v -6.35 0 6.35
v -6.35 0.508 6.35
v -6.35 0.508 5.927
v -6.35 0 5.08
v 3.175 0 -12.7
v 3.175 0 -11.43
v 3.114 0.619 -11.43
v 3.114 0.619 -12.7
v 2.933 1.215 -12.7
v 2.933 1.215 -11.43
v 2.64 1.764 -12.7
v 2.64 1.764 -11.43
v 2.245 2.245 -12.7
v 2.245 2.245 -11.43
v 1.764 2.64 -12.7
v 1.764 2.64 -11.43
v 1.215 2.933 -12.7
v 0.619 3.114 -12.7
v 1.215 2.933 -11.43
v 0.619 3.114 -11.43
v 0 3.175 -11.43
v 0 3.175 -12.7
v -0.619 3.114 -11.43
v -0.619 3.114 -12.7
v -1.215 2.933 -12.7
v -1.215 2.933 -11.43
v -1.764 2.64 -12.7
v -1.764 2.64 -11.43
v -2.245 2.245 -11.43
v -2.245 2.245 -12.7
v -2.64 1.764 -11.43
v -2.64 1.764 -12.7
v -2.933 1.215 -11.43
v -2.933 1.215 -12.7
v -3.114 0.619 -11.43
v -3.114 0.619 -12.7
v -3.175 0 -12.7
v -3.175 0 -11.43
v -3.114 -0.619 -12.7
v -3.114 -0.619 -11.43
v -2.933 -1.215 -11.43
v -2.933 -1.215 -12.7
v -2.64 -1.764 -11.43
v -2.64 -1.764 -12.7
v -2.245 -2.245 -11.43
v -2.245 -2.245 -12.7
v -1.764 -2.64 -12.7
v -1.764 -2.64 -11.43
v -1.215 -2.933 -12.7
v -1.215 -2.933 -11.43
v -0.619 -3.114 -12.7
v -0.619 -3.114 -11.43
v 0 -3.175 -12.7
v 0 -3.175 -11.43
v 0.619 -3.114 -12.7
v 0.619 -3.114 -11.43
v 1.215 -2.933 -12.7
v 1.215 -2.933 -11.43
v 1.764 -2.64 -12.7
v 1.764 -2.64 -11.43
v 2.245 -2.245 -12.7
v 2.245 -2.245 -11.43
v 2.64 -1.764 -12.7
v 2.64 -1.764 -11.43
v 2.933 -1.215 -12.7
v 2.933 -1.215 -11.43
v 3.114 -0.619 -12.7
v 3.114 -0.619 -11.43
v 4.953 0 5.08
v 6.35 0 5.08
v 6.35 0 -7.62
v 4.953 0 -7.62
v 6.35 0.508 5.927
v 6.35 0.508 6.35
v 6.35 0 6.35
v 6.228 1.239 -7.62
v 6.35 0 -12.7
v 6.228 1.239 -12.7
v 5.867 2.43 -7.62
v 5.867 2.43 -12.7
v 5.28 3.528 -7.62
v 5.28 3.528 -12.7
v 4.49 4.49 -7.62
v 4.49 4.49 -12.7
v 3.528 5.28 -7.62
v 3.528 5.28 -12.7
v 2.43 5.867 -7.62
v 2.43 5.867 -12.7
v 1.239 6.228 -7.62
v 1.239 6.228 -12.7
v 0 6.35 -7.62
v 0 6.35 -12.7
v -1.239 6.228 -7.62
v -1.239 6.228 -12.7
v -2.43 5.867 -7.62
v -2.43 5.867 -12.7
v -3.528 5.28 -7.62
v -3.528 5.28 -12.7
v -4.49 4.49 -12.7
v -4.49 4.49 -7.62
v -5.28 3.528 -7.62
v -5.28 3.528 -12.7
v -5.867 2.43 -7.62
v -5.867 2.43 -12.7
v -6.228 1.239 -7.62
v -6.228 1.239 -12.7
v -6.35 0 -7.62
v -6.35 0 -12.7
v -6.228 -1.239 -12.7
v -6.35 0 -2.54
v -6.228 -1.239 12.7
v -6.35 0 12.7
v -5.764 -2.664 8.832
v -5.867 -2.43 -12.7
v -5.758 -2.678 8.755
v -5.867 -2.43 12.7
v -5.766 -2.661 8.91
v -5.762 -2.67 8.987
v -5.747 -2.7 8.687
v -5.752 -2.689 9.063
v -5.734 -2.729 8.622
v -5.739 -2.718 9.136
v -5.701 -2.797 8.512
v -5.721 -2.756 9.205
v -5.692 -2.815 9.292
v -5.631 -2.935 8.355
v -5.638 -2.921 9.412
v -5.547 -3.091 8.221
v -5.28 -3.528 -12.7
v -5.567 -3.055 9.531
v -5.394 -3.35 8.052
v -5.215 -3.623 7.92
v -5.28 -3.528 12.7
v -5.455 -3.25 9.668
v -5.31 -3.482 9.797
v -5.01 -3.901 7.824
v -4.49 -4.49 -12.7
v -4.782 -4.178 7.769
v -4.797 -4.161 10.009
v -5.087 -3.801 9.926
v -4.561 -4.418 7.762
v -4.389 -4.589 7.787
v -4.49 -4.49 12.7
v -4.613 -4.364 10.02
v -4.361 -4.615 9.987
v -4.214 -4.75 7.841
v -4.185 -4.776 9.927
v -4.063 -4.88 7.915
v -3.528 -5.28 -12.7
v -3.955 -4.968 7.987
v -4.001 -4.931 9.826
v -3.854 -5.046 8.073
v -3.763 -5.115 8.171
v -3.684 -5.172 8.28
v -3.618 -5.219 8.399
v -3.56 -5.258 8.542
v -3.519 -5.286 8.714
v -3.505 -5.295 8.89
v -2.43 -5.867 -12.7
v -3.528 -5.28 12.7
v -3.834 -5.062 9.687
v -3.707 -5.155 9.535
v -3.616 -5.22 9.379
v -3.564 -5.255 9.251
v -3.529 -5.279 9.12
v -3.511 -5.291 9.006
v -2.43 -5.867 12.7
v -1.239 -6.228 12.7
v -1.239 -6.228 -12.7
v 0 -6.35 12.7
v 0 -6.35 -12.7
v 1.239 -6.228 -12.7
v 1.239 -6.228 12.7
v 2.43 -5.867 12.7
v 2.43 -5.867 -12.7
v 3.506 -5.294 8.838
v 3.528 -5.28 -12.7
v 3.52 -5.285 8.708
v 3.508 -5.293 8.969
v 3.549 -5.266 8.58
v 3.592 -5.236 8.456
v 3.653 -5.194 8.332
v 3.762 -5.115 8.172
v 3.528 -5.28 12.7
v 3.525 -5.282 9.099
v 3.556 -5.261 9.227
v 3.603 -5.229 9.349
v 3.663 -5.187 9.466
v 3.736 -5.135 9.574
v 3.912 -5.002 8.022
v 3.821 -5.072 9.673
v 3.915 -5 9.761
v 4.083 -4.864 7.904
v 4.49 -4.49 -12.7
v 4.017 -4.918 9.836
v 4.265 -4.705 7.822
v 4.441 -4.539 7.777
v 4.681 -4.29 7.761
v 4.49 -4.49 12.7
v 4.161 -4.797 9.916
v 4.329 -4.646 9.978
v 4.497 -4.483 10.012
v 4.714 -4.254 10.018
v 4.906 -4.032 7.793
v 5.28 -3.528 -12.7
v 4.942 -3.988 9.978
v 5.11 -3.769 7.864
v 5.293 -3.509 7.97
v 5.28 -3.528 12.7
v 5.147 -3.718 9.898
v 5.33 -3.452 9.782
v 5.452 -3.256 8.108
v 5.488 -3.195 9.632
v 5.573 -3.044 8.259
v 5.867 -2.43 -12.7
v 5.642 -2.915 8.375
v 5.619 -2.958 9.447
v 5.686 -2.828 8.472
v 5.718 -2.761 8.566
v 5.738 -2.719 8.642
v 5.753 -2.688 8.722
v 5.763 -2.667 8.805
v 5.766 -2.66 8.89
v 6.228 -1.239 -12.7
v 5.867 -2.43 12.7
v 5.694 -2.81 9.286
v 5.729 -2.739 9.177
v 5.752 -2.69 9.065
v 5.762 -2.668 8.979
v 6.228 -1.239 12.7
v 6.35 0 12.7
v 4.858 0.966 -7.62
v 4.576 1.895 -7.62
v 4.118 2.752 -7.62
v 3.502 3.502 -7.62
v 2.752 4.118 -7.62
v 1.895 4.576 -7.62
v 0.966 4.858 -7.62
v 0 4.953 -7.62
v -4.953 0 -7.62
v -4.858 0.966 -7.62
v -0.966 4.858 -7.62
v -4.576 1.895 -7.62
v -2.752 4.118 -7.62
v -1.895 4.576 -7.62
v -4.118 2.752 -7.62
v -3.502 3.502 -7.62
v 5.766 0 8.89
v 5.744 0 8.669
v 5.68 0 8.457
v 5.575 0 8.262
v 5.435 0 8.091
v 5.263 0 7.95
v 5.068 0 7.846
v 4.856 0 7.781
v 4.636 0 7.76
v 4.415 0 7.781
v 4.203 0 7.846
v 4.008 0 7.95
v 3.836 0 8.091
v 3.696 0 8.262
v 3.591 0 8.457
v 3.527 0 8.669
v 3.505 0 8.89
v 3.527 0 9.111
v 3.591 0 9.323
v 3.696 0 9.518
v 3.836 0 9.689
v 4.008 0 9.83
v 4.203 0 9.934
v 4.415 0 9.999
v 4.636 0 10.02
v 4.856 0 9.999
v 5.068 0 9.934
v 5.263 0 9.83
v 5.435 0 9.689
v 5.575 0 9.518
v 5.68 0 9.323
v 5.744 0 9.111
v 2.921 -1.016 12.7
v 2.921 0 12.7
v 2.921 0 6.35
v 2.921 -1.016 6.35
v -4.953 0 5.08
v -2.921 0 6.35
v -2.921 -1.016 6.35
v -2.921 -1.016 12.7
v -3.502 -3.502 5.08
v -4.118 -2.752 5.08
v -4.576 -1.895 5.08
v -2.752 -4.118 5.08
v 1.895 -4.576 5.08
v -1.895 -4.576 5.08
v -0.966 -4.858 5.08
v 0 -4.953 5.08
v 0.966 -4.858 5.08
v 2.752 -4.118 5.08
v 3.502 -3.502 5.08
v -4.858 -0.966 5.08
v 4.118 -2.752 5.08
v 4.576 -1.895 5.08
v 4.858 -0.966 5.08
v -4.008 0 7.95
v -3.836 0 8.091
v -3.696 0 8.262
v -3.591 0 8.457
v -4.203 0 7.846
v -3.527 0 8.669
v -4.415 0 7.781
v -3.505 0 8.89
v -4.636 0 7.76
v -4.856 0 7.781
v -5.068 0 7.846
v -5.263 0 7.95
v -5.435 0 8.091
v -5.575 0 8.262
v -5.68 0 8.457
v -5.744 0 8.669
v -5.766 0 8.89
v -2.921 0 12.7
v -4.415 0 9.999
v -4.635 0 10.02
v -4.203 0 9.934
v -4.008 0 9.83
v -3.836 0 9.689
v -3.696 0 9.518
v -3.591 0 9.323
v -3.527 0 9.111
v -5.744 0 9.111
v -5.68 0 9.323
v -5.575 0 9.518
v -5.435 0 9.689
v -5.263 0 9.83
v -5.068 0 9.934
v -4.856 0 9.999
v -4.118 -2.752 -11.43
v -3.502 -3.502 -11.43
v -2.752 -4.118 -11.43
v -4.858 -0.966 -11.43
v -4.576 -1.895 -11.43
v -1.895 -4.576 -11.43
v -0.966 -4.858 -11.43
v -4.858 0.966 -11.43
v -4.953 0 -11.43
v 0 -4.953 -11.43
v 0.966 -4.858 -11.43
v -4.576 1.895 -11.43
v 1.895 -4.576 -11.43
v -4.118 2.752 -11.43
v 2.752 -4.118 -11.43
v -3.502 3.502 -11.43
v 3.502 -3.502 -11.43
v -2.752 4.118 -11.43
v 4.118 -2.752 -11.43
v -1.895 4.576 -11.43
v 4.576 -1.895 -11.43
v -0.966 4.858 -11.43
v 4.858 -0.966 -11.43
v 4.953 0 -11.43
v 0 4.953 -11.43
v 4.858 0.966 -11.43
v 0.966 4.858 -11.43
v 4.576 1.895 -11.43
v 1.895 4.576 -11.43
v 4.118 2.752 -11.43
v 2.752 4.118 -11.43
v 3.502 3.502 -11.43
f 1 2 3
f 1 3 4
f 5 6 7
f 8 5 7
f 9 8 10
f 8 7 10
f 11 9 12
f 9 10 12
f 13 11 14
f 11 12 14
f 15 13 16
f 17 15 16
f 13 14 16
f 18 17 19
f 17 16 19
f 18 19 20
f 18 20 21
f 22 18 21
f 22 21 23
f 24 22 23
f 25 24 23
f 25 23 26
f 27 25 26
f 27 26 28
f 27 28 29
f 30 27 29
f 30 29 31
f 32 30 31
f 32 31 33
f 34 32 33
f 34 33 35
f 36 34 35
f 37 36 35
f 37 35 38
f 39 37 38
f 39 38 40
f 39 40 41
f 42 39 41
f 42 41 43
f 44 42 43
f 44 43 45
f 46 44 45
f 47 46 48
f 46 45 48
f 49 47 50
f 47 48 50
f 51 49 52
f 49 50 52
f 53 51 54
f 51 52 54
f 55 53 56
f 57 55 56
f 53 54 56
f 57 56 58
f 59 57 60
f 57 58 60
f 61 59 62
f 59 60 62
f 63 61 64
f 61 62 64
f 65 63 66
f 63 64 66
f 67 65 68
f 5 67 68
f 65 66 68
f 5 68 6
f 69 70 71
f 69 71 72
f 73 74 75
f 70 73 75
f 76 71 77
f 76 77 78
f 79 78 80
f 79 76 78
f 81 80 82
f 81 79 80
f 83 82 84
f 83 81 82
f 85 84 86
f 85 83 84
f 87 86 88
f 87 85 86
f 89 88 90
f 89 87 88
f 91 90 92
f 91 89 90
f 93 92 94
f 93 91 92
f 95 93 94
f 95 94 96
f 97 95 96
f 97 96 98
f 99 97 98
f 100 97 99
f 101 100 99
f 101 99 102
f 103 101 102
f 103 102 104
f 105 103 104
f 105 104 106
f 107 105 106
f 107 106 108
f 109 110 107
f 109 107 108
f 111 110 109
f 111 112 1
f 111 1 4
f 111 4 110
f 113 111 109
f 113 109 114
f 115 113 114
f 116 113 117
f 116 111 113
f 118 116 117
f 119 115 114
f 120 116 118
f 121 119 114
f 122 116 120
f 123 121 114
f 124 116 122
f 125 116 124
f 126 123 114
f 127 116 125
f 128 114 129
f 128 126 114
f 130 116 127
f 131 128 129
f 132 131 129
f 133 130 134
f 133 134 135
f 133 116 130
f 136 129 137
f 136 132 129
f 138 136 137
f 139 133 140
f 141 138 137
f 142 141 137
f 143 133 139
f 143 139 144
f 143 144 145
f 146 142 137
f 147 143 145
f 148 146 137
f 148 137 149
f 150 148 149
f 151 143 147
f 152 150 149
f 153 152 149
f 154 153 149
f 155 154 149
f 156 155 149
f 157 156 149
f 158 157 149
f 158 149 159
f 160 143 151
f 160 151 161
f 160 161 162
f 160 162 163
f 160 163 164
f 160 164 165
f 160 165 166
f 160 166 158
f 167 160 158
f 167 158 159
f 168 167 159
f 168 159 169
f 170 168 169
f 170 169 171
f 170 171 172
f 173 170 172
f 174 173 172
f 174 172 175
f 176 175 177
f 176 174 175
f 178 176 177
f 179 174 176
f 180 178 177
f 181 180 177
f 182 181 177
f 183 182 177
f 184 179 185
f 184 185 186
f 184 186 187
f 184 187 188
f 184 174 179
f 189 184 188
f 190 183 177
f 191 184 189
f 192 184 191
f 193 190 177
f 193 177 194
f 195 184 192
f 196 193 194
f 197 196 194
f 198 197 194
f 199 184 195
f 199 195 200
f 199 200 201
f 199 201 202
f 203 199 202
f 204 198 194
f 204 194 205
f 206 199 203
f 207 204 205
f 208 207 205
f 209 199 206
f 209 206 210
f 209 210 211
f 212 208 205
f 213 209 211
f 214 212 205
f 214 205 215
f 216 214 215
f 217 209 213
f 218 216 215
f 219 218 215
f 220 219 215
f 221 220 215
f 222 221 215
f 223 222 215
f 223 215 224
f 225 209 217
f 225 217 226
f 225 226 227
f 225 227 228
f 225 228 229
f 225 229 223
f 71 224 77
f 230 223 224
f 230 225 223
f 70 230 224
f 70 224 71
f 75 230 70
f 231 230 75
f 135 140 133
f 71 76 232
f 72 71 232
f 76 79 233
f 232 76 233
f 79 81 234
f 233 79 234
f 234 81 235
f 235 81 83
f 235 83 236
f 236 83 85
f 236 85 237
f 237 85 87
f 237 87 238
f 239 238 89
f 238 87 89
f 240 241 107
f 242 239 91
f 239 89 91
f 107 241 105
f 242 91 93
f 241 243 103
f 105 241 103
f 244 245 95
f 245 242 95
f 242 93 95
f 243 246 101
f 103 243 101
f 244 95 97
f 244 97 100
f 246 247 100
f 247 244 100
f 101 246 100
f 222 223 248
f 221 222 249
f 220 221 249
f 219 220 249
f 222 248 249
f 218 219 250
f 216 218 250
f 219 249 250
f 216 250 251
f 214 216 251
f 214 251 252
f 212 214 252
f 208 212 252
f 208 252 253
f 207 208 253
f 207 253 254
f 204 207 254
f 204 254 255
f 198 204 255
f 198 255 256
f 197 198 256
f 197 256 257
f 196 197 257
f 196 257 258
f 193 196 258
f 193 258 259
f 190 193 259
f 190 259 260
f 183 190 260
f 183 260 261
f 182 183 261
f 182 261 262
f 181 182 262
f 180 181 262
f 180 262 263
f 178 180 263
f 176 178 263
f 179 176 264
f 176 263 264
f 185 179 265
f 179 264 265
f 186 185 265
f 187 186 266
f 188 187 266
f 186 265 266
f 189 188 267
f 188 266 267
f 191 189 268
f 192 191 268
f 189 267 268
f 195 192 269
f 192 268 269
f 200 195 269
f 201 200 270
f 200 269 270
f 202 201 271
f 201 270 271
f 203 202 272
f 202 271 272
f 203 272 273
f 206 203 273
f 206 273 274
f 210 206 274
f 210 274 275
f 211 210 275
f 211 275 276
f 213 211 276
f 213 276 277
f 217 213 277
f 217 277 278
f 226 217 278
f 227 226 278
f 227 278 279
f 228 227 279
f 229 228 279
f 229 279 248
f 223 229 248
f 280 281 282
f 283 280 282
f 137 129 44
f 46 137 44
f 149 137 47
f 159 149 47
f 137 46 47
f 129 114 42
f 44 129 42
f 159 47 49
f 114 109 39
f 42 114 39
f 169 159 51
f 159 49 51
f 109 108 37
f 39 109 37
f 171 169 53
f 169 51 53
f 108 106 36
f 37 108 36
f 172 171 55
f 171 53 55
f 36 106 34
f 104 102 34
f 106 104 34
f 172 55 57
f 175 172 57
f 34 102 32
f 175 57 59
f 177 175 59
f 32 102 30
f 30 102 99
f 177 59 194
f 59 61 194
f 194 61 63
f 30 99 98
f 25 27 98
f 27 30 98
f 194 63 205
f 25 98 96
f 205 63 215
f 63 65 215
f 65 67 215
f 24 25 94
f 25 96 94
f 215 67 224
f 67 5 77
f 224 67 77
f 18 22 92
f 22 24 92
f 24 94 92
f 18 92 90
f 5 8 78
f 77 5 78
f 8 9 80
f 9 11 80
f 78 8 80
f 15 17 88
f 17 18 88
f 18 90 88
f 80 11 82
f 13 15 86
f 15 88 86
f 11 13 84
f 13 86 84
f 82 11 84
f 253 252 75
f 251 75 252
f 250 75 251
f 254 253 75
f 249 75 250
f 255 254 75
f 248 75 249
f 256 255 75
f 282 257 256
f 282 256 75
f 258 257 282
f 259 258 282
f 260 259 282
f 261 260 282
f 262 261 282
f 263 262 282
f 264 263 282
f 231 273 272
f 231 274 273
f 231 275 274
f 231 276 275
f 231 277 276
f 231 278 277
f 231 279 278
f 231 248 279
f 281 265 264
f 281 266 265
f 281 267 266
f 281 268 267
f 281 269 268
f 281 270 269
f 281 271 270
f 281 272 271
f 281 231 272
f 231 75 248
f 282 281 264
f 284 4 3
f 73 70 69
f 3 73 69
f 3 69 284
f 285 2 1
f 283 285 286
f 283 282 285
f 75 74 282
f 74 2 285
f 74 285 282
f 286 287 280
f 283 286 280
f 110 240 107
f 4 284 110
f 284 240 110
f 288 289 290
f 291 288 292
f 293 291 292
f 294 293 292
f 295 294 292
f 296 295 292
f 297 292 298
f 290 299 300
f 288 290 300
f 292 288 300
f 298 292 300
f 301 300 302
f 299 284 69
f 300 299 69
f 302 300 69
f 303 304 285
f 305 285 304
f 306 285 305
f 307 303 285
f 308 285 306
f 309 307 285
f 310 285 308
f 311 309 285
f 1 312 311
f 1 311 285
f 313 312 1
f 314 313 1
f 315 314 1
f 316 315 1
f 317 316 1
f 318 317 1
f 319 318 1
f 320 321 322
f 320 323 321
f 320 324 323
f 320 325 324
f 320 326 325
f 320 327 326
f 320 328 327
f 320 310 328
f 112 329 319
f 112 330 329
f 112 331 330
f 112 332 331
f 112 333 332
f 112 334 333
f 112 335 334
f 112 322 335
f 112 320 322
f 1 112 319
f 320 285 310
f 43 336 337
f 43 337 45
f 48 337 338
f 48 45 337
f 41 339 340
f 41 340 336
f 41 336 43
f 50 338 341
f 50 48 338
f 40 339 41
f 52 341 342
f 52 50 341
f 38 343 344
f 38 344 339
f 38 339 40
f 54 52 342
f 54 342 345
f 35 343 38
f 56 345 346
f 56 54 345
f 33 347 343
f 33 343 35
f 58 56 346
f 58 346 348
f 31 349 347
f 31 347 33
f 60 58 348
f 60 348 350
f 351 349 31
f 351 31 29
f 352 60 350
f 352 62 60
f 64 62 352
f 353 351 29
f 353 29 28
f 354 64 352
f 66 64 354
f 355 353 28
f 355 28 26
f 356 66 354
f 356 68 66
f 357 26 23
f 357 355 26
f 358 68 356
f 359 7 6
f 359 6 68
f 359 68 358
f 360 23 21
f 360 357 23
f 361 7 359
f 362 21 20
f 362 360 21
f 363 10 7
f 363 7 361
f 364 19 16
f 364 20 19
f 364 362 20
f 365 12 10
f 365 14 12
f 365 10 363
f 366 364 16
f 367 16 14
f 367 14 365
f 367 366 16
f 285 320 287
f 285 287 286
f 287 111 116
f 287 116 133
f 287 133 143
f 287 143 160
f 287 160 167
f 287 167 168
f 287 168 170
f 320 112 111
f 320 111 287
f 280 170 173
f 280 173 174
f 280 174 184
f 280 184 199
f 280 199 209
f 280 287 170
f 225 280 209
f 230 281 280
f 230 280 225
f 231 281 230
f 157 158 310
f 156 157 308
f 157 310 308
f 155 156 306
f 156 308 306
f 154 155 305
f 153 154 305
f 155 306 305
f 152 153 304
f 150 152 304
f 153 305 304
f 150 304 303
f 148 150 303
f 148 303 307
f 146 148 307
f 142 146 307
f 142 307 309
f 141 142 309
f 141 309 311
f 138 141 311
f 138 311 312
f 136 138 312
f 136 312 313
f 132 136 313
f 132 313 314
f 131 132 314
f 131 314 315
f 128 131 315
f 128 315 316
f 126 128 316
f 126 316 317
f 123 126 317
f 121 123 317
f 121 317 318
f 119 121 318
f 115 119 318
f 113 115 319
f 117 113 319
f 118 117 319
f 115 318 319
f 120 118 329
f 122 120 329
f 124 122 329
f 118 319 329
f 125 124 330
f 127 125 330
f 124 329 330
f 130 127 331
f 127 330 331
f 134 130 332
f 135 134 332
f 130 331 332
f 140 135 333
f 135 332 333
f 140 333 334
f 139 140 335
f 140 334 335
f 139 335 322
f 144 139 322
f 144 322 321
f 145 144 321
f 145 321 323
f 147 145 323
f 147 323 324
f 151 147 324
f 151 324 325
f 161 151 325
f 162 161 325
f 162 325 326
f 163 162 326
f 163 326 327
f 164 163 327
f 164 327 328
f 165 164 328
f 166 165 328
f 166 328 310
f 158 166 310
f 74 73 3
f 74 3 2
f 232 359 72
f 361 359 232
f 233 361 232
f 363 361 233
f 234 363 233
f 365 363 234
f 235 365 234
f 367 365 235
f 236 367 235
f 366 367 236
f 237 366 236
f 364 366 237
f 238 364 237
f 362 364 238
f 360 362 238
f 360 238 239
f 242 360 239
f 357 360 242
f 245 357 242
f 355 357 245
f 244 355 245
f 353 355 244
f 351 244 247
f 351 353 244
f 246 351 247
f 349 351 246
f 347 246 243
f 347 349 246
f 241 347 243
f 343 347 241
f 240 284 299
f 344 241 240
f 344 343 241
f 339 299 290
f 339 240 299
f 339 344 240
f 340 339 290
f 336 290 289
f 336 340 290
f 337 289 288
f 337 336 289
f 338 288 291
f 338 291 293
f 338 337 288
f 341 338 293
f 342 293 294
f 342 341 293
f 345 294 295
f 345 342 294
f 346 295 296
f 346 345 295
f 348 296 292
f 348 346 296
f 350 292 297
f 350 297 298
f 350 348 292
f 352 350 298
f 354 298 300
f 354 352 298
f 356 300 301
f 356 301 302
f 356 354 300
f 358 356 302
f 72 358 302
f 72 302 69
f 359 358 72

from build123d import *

# Parameters (mm, degrees)
SKETCH1_R               = 6.35
BOSS_EXTRUDE1_DEPTH     = 12.7
SKETCH3_W               = 12.7
SKETCH3_H               = 15.24
CUT_EXTRUDE2_DEPTH      = 7.35
CUT_EXTRUDE3_START      = -2.54
SKETCH4_R               = 4.953
CUT_EXTRUDE3_DEPTH      = 6.35
CUT_EXTRUDE3_DEPTH_BACK = 6.35
SKETCH5_R               = 3.175
CUT_EXTRUDE4_DEPTH      = 2.27
SKETCH7_W               = 5.842
SKETCH7_H               = 6.35
CUT_EXTRUDE5_DEPTH      = 1.016
SKETCH8_R               = 1.1303
CUT_EXTRUDE6_DEPTH      = 7.35
SKETCH10_R              = 4.953
CUT_EXTRUDE7_DEPTH      = 16.51
SKETCH11_W              = 12.869582419
SKETCH11_H              = 6.56213844
CUT_EXTRUDE8_DEPTH      = 12.7
BOSS_EXTRUDE2_DEPTH     = 6.35


with BuildPart() as part:
    # Sketch1 → Boss-Extrude1 (new body, symmetric)
    with BuildSketch(Plane.XY):
        Circle(SKETCH1_R)
    extrude(amount=BOSS_EXTRUDE1_DEPTH, both=True)

    # Sketch3 → Cut-Extrude2 (cut, through all)
    with BuildSketch(Plane(origin=(0, 0, 0), x_dir=(1, 0, 0), z_dir=(0, 1, 0))):
        with Locations((0, -5.08)):
            Rectangle(SKETCH3_W, SKETCH3_H)
    extrude(amount=CUT_EXTRUDE2_DEPTH, mode=Mode.SUBTRACT)

    # Sketch4 → Cut-Extrude3 (cut, two sides)
    with BuildSketch(Plane.XY.offset(-2.54).offset(CUT_EXTRUDE3_START)) as cut_extrude3_sk:
        Circle(SKETCH4_R)
    extrude(amount=CUT_EXTRUDE3_DEPTH, mode=Mode.SUBTRACT)
    extrude(cut_extrude3_sk.sketch, amount=-CUT_EXTRUDE3_DEPTH_BACK, mode=Mode.SUBTRACT)

    # Sketch5 → Cut-Extrude4 (cut, through all)
    with BuildSketch(Plane.XY.offset(-11.43)):
        Circle(SKETCH5_R)
    extrude(amount=-CUT_EXTRUDE4_DEPTH, mode=Mode.SUBTRACT)

    # Sketch7 → Cut-Extrude5 (cut)
    with BuildSketch(Plane(origin=(0, 0, 0), x_dir=(1, 0, 0), z_dir=(0, 1, 0))):
        with Locations((0, -9.525)):
            Rectangle(SKETCH7_W, SKETCH7_H)
    extrude(amount=-CUT_EXTRUDE5_DEPTH, mode=Mode.SUBTRACT)

    # Sketch8 → Cut-Extrude6 (cut, through all)
    with BuildSketch(Plane(origin=(0, 0, 0), x_dir=(1, 0, 0), z_dir=(0, 1, 0))):
        with Locations((-4.6355, -8.89)):
            Circle(SKETCH8_R)
        with Locations((4.6355, -8.89)):
            Circle(SKETCH8_R)
    extrude(amount=-CUT_EXTRUDE6_DEPTH, mode=Mode.SUBTRACT)

    # Sketch10 → Cut-Extrude7 (cut)
    with BuildSketch(Plane.XY.offset(-11.43)):
        Circle(SKETCH10_R)
    extrude(amount=CUT_EXTRUDE7_DEPTH, mode=Mode.SUBTRACT)

    # Sketch11 → Cut-Extrude8 (cut)
    with BuildSketch(Plane(origin=(0, 0, 5.08), x_dir=(-1, 0, 0), z_dir=(0, 0, -1))):
        with Locations((-0.08479121, 3.28106922)):
            Rectangle(SKETCH11_W, SKETCH11_H)
    extrude(amount=CUT_EXTRUDE8_DEPTH, mode=Mode.SUBTRACT)

    # Sketch12 → Boss-Extrude2 (add, symmetric)
    with BuildSketch(Plane(origin=(0, 0, 0), x_dir=(0, 0, -1), z_dir=(1, 0, 0))):
        Polygon((-6.35, 0), (-5.08, 0), (-5.9270724, 0.508), (-6.35, 0.508), align=None)
    extrude(amount=BOSS_EXTRUDE2_DEPTH, both=True)


solid = part.part
